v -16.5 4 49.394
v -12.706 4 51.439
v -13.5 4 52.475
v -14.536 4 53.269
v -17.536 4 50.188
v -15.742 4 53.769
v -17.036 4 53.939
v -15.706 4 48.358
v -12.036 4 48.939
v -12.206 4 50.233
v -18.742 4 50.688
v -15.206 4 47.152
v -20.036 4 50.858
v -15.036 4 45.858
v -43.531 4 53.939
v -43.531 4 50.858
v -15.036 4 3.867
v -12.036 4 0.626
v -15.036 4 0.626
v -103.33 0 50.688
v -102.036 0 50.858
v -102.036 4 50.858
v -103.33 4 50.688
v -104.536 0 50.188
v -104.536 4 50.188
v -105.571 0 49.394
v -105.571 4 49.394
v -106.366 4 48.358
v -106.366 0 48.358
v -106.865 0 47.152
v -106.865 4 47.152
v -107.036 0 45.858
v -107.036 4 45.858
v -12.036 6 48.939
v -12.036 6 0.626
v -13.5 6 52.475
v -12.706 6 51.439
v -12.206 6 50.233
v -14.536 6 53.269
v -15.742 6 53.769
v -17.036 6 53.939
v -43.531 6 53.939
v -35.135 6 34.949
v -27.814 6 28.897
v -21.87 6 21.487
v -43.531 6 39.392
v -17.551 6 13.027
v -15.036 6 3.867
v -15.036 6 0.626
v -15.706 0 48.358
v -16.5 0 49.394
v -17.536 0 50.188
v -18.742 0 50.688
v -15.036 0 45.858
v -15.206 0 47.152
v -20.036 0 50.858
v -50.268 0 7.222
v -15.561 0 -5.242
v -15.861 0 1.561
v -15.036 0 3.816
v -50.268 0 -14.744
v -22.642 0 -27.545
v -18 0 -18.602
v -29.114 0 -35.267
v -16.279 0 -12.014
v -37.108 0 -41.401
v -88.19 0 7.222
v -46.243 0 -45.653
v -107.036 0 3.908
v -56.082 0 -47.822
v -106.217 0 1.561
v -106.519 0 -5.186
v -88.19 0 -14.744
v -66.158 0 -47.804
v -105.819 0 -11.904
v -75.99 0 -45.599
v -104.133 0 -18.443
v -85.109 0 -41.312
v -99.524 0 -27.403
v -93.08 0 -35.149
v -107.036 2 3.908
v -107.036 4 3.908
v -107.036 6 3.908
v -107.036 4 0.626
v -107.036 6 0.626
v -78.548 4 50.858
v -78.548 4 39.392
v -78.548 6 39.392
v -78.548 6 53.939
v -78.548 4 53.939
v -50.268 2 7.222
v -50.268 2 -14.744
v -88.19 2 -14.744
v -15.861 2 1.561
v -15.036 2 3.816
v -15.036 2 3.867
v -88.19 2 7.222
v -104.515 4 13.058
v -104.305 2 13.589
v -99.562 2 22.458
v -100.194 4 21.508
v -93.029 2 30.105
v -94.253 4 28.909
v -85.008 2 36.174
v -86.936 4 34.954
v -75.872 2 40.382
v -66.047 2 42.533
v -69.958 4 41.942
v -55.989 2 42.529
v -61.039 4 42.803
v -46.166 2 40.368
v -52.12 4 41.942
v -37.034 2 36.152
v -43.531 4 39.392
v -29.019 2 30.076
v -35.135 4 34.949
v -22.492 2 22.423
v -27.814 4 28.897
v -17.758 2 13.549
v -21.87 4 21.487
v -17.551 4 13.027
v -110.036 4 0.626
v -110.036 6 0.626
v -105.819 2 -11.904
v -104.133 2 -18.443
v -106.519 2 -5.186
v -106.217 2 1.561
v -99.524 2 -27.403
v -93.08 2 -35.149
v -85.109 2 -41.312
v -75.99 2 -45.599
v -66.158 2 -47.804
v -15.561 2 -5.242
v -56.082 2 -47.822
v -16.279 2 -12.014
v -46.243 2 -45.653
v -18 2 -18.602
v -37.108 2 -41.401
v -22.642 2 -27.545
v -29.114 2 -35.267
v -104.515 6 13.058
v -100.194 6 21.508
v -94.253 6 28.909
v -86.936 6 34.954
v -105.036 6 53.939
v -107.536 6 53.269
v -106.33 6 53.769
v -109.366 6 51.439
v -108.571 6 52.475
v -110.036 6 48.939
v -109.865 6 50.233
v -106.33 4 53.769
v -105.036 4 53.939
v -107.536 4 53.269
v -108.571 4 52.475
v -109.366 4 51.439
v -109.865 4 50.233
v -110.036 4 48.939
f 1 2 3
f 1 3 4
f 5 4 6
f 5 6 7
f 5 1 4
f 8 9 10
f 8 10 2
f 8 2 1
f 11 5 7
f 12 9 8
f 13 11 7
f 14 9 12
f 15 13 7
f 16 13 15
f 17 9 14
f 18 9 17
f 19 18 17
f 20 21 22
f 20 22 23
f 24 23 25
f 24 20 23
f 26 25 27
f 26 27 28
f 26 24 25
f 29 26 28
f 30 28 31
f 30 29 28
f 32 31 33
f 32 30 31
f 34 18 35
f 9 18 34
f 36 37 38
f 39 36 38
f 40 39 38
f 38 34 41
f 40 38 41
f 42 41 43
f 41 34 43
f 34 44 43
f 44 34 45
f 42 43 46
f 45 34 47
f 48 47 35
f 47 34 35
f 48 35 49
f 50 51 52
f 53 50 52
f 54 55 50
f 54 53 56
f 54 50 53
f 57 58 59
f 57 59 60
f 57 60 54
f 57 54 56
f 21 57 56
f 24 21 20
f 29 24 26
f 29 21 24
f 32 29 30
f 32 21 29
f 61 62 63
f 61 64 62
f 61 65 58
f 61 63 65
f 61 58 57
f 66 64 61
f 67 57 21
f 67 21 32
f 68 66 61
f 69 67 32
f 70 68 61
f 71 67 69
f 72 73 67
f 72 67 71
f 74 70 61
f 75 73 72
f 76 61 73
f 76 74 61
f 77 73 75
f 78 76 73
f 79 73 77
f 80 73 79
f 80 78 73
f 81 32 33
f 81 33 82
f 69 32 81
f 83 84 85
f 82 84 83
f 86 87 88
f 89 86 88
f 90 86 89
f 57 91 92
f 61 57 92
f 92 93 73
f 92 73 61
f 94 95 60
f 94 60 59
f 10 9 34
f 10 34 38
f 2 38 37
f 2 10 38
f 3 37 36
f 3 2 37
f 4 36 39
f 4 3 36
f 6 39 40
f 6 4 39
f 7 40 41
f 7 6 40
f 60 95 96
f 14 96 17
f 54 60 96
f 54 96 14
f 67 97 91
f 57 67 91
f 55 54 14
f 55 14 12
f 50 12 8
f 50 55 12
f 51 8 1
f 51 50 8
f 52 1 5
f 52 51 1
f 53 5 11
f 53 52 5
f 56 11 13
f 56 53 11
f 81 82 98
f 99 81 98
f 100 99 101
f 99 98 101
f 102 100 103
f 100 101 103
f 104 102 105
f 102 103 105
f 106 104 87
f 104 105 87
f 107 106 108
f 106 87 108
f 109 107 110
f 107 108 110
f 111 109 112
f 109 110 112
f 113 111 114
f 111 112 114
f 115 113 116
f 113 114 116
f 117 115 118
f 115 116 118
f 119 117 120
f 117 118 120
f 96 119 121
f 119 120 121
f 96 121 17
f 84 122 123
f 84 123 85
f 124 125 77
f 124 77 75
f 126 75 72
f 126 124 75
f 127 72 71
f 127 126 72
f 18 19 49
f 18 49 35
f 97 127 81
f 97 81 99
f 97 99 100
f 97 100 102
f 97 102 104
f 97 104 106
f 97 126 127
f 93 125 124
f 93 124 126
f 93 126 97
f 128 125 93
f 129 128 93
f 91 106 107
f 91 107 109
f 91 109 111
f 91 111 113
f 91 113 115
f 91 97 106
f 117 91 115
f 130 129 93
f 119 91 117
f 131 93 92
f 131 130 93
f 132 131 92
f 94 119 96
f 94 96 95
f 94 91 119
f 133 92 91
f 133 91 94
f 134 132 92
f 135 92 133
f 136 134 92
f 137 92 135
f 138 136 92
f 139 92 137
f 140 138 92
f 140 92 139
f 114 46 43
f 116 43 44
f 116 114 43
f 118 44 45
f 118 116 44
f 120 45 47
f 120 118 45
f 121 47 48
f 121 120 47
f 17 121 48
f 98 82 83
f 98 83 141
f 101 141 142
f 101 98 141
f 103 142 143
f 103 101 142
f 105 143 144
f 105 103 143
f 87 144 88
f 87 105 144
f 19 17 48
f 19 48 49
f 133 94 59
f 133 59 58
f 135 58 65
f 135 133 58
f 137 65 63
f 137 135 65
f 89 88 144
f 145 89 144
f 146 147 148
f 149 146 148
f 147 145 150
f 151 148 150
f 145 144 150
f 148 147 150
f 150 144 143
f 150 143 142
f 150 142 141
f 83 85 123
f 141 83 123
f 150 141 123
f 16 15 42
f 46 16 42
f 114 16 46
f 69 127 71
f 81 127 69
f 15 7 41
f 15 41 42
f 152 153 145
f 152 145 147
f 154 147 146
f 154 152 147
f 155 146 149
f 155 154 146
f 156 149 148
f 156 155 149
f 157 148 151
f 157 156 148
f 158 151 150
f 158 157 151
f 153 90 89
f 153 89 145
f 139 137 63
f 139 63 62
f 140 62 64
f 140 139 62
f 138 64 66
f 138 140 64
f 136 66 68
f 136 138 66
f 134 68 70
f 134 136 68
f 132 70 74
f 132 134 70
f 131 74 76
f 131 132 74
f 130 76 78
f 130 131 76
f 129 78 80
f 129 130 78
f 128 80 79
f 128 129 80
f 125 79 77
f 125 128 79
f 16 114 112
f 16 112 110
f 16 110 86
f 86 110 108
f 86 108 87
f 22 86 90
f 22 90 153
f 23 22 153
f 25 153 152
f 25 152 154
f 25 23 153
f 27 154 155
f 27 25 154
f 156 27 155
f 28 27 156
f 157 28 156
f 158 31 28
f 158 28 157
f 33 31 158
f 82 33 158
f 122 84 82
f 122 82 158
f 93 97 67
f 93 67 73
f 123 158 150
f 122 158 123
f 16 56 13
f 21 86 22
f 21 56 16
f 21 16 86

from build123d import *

# Parameters (mm, degrees)
BOSS_EXTRUDE2_DEPTH = 4
CUT_EXTRUDE3_DEPTH  = 4
SKETCH6_R           = 46.644893749
CUT_EXTRUDE4_DEPTH  = 2
SKETCH7_W           = 37.921763703
SKETCH7_H           = 21.966033547
CUT_EXTRUDE5_DEPTH  = 2
CUT_EXTRUDE7_DEPTH  = 10
BOSS_EXTRUDE3_DEPTH = 2


with BuildPart() as part:
    # Sketch4 → Boss-Extrude2 (new body)
    with BuildSketch(Plane(origin=(0, 0, 0), x_dir=(1, 0, 0), z_dir=(0, 1, 0))):
        with BuildLine():
            Line((-107.035735829, 49.14195745), (-15.035735829, 49.14195745))
            Line((-15.035735829, 49.14195745), (-15.035735829, -45.85804255))
            ThreePointArc((-15.035735829, -45.85804255), (-16.500201924, -49.393576456), (-20.035735829, -50.85804255))
            Line((-20.035735829, -50.85804255), (-102.035735829, -50.85804255))
            ThreePointArc((-102.035735829, -50.85804255), (-105.571269735, -49.393576456), (-107.035735829, -45.85804255))
            Line((-107.035735829, -45.85804255), (-107.035735829, 49.14195745))
        make_face()
    extrude(amount=BOSS_EXTRUDE2_DEPTH)

    # Sketch5 → Cut-Extrude3 (cut)
    with BuildSketch(Plane(origin=(0, 4, 0), x_dir=(1, 0, 0), z_dir=(0, 1, 0))):
        with BuildLine():
            Line((-122.184107688, 54.312207558), (-0.881081782, 54.312207558))
            Line((-0.881081782, 54.312207558), (-0.881081782, -1.763818638))
            Line((-0.881081782, -1.763818638), (-15.035735829, -1.763818638))
            ThreePointArc((-15.035735829, -1.763818638), (-61.035735829, 48.088703252), (-107.035735829, -1.763818638))
            Line((-107.035735829, -1.763818638), (-116.20594022, -1.763818638))
            Line((-116.20594022, -1.763818638), (-122.184107688, 54.312207558))
        make_face()
    extrude(amount=-CUT_EXTRUDE3_DEPTH, mode=Mode.SUBTRACT)

    # Sketch6 → Cut-Extrude4 (cut)
    with BuildSketch(Plane(origin=(0, 4, 0), x_dir=(1, 0, 0), z_dir=(0, 1, 0))):
        with Locations((-61.039241489, 3.84195745)):
            Circle(SKETCH6_R)
    extrude(amount=-CUT_EXTRUDE4_DEPTH, mode=Mode.SUBTRACT)

    # Sketch7 → Cut-Extrude5 (cut)
    with BuildSketch(Plane(origin=(0, 2, 0), x_dir=(1, 0, 0), z_dir=(0, 1, 0))):
        with Locations((-69.228954178, 3.760987583)):
            Rectangle(SKETCH7_W, SKETCH7_H)
    extrude(amount=-CUT_EXTRUDE5_DEPTH, mode=Mode.SUBTRACT)

    # Sketch13 → Cut-Extrude7 (cut)
    with BuildSketch(Plane(origin=(0, 2, 0), x_dir=(1, 0, 0), z_dir=(0, 1, 0))):
        with BuildLine():
            Line((-106.217317024, -1.560957592), (-107.035735829, -3.908437462))
            Line((-107.035735829, -3.908437462), (-110.118060938, -1.560957592))
            ThreePointArc((-110.118060938, -1.560957592), (-61.039241489, 53.217275266), (-11.960422041, -1.560957592))
            Line((-11.960422041, -1.560957592), (-15.035735829, -3.816260145))
            Line((-15.035735829, -3.816260145), (-15.861165954, -1.560957592))
            ThreePointArc((-15.861165954, -1.560957592), (-61.039241489, 49.34195745), (-106.217317024, -1.560957592))
        make_face()
    extrude(amount=-CUT_EXTRUDE7_DEPTH, mode=Mode.SUBTRACT)

    # Sketch10 → Boss-Extrude3 (add)
    with BuildSketch(Plane(origin=(0, 4, 0), x_dir=(1, 0, 0), z_dir=(0, 1, 0))):
        with BuildLine():
            Line((-110.035735829, -0.626443871), (-107.035735829, -0.626443871))
            Line((-107.035735829, -0.626443871), (-107.035735829, -3.908437462))
            ThreePointArc((-107.035735829, -3.908437462), (-97.412251623, -25.359930275), (-78.547707812, -39.392284997))
            Line((-78.547707812, -39.392284997), (-78.547707812, -53.939312876))
            Line((-78.547707812, -53.939312876), (-105.035735829, -53.939312876))
            ThreePointArc((-105.035735829, -53.939312876), (-108.571269735, -52.474846782), (-110.035735829, -48.939312876))
            Line((-110.035735829, -48.939312876), (-110.035735829, -0.626443871))
        make_face()
        with BuildLine():
            Line((-12.035735829, -0.626443871), (-12.035735829, -48.939312876))
            ThreePointArc((-12.035735829, -48.939312876), (-13.500201924, -52.474846782), (-17.035735829, -53.939312876))
            Line((-17.035735829, -53.939312876), (-43.530775166, -53.939312876))
            Line((-43.530775166, -53.939312876), (-43.530775166, -39.392284997))
            ThreePointArc((-43.530775166, -39.392284997), (-24.652990845, -25.343430622), (-15.035735829, -3.86671169))
            Line((-15.035735829, -3.86671169), (-15.035735829, -0.626443871))
            Line((-15.035735829, -0.626443871), (-12.035735829, -0.626443871))
        make_face()
    extrude(amount=BOSS_EXTRUDE3_DEPTH)


solid = part.part
